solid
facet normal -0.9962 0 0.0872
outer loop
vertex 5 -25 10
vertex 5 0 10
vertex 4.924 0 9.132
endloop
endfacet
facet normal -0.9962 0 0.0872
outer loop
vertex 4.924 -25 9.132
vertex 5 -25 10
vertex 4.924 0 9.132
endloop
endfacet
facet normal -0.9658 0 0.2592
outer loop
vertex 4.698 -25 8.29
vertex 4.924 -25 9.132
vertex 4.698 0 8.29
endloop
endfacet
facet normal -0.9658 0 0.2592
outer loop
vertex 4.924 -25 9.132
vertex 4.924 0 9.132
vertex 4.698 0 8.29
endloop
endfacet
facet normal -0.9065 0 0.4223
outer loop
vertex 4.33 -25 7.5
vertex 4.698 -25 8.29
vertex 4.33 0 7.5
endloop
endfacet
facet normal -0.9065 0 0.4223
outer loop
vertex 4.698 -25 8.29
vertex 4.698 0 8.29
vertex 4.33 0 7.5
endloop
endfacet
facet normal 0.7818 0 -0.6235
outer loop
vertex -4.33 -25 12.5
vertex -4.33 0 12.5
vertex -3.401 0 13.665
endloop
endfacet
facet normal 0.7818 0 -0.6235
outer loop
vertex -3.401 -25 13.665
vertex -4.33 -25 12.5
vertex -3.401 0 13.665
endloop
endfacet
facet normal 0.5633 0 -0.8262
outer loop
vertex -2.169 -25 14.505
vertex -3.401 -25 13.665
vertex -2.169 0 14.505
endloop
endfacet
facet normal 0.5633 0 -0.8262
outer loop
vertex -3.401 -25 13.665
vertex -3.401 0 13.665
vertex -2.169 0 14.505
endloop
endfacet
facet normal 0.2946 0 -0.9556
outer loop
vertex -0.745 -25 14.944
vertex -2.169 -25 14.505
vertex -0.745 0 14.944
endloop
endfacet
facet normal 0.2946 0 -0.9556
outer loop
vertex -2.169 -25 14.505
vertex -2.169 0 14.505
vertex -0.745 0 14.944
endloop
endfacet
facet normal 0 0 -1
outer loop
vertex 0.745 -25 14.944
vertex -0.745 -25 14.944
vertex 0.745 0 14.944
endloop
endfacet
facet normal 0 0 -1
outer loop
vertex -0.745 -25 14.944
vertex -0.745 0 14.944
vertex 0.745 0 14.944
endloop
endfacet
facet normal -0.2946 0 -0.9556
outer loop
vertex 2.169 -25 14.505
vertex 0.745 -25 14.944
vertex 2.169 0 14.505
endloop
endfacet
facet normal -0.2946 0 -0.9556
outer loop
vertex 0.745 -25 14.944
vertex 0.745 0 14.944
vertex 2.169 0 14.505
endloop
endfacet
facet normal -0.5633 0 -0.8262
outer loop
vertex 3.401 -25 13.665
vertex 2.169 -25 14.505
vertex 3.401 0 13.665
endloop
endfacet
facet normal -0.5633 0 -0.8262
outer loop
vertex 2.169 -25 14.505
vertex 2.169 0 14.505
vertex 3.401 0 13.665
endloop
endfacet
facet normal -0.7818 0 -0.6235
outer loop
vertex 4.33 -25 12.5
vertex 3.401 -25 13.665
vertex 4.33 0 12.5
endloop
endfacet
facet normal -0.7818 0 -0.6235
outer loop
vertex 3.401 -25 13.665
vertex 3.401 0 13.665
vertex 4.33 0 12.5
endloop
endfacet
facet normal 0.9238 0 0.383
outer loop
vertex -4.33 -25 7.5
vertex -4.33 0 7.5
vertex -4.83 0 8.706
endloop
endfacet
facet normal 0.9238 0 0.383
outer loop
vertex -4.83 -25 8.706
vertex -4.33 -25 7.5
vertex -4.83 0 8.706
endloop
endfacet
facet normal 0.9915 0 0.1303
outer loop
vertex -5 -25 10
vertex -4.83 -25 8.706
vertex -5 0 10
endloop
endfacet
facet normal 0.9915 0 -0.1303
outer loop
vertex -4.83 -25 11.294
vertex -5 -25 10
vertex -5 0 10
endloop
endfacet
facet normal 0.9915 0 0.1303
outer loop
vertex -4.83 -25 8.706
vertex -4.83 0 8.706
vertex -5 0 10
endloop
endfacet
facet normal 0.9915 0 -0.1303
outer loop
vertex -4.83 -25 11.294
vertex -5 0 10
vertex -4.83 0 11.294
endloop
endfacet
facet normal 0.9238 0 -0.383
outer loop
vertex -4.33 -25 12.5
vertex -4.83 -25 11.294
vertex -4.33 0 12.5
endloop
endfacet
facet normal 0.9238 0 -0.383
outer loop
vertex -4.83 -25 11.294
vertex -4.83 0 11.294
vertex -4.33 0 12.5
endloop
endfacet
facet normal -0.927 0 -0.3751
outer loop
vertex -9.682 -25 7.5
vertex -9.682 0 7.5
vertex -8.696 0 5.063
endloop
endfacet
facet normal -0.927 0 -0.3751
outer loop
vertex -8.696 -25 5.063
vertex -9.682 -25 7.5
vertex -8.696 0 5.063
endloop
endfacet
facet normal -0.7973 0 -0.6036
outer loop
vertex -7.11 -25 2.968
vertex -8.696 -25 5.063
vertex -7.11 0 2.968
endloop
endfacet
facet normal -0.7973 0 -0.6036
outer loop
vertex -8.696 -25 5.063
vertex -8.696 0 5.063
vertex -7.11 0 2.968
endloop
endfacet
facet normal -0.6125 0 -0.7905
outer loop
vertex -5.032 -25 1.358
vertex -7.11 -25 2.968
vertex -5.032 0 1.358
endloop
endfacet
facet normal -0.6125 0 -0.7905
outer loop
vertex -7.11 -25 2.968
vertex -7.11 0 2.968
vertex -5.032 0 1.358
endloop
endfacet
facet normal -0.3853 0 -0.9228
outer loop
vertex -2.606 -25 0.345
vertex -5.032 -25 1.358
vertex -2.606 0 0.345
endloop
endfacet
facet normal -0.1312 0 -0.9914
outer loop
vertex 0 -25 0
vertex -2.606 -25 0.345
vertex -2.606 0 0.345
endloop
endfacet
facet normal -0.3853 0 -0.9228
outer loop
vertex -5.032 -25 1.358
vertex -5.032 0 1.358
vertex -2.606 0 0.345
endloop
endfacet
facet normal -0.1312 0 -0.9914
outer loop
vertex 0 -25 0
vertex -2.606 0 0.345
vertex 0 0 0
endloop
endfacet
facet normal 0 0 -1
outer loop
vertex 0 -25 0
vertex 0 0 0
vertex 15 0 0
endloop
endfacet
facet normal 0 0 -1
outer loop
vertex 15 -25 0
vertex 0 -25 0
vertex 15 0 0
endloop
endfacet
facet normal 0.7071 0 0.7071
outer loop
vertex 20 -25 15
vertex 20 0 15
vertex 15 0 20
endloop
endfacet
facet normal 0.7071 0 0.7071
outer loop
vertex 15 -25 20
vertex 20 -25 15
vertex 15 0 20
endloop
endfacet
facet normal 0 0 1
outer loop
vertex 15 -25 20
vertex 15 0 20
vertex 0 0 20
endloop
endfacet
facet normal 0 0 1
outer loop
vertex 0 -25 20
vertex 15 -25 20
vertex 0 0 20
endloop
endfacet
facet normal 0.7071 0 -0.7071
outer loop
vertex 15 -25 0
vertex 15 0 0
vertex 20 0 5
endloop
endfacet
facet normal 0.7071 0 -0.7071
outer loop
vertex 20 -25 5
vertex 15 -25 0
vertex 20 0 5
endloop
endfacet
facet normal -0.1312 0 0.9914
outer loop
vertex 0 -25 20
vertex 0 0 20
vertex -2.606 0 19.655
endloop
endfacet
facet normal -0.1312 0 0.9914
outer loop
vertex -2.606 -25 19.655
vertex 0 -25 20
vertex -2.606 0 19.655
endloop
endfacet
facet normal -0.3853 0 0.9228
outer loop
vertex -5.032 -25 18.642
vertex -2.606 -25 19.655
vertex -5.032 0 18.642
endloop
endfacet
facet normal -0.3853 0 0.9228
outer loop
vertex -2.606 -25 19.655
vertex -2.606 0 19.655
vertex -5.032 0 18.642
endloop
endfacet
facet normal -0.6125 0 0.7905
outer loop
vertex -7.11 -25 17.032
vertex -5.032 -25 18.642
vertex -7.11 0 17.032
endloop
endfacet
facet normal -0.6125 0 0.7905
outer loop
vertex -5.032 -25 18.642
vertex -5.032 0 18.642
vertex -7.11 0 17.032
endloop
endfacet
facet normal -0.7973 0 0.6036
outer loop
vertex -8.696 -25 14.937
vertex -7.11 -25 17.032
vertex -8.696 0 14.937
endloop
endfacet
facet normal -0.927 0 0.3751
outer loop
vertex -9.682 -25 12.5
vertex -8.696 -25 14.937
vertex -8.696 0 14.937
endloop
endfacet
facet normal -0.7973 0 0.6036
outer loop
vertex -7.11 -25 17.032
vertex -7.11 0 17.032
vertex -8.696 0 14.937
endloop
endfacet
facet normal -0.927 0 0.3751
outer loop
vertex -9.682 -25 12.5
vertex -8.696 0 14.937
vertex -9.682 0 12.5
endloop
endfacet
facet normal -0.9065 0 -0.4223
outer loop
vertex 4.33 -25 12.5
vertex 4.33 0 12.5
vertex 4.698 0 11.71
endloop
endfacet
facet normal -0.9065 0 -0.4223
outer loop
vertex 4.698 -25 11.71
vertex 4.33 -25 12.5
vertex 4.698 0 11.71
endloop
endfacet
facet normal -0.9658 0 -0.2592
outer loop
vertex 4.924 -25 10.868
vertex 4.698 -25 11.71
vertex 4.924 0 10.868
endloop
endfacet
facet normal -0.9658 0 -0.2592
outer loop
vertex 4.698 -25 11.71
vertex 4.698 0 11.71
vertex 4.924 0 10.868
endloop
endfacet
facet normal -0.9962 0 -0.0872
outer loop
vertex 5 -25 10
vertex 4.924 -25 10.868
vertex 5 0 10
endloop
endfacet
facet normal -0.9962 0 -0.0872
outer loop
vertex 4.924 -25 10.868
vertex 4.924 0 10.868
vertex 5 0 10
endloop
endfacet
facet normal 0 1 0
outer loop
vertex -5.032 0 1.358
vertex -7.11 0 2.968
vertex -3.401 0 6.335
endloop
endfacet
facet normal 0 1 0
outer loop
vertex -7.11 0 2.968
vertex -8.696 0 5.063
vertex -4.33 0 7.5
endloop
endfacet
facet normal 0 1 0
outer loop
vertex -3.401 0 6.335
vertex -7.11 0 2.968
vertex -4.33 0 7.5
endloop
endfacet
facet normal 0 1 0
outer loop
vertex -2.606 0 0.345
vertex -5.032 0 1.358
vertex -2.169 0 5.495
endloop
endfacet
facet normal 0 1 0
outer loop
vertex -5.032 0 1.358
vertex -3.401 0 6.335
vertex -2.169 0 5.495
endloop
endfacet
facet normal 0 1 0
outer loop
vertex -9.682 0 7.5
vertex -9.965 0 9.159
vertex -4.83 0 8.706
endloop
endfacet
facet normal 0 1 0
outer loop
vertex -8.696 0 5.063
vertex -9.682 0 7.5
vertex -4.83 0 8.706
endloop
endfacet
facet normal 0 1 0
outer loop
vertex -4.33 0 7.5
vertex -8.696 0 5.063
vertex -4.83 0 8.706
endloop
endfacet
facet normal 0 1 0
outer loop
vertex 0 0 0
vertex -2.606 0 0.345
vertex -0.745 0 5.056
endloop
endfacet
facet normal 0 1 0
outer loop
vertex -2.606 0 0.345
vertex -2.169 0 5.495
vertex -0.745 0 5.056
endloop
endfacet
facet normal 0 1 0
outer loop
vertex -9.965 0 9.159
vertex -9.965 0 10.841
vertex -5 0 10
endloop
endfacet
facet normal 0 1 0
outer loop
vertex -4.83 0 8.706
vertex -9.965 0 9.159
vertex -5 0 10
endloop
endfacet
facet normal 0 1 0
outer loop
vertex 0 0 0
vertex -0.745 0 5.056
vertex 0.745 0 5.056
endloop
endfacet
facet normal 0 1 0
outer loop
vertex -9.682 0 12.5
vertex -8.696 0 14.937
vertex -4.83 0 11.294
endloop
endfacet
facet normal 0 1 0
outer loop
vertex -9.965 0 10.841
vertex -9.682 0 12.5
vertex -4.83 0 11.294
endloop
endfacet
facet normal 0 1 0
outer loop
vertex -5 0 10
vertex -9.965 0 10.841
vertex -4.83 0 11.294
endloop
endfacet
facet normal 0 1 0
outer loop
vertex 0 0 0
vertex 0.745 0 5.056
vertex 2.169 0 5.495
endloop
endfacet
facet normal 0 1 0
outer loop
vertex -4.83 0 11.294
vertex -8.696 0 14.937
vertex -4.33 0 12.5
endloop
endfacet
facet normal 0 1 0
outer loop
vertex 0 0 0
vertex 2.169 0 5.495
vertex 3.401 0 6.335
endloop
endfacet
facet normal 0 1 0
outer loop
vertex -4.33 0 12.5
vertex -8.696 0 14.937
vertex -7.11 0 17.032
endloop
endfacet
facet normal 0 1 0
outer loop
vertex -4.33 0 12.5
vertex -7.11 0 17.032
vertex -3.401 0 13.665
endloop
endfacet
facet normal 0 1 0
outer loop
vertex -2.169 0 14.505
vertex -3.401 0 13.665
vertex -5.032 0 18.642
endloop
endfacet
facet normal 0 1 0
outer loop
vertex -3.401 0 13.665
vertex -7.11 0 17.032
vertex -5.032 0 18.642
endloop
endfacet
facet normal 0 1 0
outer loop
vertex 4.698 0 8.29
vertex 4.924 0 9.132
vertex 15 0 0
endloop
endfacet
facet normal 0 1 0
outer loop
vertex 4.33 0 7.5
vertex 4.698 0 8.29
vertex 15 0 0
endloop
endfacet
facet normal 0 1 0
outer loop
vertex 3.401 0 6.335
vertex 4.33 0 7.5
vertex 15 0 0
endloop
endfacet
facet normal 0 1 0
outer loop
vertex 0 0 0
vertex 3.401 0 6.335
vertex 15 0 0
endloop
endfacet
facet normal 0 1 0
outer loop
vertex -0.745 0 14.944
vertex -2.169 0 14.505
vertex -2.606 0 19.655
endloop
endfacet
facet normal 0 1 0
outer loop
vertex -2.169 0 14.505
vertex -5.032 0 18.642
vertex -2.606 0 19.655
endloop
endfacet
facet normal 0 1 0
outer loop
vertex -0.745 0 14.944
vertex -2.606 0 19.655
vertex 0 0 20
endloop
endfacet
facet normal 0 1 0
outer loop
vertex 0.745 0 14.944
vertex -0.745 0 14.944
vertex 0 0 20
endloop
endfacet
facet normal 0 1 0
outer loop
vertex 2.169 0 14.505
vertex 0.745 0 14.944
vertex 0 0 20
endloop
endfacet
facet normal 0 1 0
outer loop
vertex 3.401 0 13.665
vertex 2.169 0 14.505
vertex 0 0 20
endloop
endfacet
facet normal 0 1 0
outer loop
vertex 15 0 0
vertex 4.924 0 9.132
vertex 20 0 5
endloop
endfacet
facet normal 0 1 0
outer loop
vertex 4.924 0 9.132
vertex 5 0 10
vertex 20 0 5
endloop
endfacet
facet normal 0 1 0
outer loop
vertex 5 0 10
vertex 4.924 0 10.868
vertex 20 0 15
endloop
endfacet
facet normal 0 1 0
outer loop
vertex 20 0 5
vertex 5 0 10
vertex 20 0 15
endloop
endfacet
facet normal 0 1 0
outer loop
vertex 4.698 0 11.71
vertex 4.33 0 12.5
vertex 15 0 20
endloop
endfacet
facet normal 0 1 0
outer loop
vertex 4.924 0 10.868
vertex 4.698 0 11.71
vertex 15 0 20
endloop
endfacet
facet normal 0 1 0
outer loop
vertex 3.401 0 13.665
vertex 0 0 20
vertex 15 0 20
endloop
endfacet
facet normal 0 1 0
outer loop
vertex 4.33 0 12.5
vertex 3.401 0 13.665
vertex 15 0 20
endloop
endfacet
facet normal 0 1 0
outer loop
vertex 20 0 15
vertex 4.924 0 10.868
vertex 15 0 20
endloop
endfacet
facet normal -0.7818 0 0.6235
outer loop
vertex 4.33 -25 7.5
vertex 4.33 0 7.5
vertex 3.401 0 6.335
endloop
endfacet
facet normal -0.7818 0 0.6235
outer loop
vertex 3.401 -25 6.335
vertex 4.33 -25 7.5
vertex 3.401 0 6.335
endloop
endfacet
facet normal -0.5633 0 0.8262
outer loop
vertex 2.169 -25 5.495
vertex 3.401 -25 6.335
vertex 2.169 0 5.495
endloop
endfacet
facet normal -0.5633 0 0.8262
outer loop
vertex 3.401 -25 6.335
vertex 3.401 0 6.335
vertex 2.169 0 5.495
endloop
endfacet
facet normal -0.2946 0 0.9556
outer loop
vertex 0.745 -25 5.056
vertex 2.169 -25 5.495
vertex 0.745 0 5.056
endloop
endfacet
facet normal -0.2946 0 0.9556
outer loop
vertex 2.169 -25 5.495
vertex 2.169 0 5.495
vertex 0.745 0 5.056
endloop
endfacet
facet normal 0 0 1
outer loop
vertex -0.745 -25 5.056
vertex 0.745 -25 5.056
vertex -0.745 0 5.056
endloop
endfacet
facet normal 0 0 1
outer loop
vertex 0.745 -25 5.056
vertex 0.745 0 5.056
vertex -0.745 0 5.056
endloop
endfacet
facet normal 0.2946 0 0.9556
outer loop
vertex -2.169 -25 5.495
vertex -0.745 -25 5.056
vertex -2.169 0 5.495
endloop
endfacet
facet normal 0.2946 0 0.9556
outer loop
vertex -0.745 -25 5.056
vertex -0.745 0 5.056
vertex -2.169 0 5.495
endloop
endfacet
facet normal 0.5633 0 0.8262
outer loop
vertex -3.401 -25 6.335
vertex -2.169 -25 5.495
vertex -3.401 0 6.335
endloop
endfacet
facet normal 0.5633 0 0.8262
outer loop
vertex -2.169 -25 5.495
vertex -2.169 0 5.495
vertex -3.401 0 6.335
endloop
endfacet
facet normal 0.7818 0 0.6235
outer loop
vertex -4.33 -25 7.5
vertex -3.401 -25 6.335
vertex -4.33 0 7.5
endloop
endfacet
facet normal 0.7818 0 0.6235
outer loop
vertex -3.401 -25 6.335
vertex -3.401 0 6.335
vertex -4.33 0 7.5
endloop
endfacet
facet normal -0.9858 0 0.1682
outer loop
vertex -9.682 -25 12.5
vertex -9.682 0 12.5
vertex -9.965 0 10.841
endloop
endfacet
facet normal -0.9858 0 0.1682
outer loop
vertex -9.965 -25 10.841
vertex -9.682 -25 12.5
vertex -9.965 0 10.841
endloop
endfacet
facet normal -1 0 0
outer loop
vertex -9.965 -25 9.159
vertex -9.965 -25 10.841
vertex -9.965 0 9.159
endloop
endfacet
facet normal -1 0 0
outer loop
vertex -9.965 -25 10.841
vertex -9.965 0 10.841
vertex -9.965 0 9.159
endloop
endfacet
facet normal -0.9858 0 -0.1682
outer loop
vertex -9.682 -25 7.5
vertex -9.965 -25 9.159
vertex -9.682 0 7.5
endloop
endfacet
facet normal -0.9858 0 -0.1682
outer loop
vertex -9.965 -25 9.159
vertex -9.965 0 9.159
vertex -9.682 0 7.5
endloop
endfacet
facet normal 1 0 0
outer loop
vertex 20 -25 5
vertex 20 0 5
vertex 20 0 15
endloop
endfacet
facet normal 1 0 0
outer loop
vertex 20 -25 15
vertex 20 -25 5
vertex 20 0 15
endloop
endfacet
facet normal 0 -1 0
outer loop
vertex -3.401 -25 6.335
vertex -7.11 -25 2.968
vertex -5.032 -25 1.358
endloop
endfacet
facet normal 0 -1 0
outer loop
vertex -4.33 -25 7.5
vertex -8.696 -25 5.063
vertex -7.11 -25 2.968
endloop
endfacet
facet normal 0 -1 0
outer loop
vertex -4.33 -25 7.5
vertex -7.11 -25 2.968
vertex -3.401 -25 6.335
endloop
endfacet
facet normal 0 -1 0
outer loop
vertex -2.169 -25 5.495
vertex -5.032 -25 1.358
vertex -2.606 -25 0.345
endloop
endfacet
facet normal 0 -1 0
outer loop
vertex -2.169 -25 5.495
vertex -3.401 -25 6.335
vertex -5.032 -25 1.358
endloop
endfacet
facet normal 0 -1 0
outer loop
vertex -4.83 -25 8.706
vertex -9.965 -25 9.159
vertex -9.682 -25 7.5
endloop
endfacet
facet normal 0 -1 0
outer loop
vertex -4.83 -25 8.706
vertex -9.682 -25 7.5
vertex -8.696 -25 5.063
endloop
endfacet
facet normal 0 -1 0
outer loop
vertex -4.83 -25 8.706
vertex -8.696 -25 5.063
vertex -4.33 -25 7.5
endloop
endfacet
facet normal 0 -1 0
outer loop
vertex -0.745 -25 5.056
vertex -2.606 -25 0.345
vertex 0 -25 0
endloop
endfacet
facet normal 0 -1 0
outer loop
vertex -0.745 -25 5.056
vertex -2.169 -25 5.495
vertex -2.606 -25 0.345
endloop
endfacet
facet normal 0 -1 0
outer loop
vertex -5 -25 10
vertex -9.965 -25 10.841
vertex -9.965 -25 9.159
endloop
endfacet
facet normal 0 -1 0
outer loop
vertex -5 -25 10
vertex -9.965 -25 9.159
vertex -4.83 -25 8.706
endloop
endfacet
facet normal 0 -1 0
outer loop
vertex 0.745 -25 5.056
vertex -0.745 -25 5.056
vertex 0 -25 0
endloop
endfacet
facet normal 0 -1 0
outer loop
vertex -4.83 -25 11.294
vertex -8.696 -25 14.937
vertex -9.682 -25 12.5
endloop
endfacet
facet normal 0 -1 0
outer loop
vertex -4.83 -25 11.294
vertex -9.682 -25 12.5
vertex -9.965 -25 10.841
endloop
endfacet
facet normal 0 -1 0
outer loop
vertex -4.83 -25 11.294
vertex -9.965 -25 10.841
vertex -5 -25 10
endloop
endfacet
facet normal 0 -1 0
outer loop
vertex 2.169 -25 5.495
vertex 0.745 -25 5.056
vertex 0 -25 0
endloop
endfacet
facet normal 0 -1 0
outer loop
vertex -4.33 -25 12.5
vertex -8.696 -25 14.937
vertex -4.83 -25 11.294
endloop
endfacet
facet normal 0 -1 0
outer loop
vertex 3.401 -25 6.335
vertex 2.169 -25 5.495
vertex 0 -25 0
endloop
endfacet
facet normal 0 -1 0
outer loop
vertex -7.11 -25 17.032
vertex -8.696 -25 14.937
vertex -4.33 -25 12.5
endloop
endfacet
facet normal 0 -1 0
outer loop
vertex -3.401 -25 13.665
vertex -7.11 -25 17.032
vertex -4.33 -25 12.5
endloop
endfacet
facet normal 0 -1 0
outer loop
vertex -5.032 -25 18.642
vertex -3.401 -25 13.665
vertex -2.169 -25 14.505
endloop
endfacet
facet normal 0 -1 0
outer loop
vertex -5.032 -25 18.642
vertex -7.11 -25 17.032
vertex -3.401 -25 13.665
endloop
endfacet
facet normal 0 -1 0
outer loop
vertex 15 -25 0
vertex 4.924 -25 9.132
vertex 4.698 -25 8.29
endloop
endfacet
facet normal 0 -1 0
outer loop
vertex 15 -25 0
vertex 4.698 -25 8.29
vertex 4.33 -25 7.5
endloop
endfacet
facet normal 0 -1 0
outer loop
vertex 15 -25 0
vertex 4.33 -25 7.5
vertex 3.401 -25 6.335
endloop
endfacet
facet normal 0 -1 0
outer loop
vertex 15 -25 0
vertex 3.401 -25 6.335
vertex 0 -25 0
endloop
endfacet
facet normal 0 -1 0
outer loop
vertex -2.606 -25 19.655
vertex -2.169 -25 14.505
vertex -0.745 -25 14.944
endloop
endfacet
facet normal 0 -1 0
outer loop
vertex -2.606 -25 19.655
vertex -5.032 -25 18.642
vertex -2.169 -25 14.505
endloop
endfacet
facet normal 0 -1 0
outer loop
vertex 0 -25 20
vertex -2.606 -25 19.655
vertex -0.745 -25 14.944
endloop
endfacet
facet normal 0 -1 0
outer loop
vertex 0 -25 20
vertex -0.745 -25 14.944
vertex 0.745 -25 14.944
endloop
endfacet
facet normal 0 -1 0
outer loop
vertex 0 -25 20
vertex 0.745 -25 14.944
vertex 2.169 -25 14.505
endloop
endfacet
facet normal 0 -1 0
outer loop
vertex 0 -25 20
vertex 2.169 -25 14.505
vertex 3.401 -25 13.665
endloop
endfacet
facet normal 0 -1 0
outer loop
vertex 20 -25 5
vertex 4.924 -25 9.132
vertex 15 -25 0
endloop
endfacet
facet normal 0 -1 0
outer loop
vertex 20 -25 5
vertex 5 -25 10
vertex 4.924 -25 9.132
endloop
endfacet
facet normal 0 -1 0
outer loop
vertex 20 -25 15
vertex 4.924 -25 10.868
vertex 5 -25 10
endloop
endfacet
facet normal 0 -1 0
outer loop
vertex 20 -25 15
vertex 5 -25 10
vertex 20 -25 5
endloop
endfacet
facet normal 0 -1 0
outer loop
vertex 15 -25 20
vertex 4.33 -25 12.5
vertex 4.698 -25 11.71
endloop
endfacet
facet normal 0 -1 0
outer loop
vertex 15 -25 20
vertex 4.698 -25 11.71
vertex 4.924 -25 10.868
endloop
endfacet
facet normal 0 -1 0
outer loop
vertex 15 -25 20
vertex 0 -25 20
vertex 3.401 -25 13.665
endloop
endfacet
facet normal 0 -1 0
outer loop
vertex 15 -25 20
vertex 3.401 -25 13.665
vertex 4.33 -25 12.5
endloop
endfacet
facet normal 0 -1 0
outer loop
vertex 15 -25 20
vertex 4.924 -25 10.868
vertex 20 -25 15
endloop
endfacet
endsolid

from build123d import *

# Parameters (mm, degrees)
F1_DEPTH = 25


with BuildPart() as f1:
    # F0 (on Front) → F1 (new body)
    with BuildSketch(Plane.XZ):
        with BuildLine():
            ThreePointArc((9.682458, 7.5), (6.123724, 2.094306), (0, 0))
            Line((0, 0), (15, 0))
            Line((15, 0), (20, 5))
            Line((20, 5), (20, 7.5))
            Line((20, 7.5), (9.682458, 7.5))
        make_face()
        with BuildLine():
            ThreePointArc((-9.682458, 7.5), (-6.123724, 2.094306), (0, 0))
            ThreePointArc((0, 0), (6.123724, 2.094306), (9.682458, 7.5))
            Line((9.682458, 7.5), (4.330127, 7.5))
            ThreePointArc((4.330127, 7.5), (0, 5), (-4.330127, 7.5))
            Line((-4.330127, 7.5), (-9.682458, 7.5))
        make_face()
        with BuildLine():
            ThreePointArc((-9.682458, 12.5), (-10, 10), (-9.682458, 7.5))
            Line((-9.682458, 7.5), (-4.330127, 7.5))
            ThreePointArc((-4.330127, 7.5), (-5, 10), (-4.330127, 12.5))
            Line((-4.330127, 12.5), (-9.682458, 12.5))
        make_face()
        with BuildLine():
            Line((4.330127, 7.5), (9.682458, 7.5))
            Line((9.682458, 7.5), (20, 7.5))
            Line((20, 7.5), (20, 12.5))
            Line((20, 12.5), (9.682458, 12.5))
            Line((9.682458, 12.5), (4.330127, 12.5))
            ThreePointArc((4.330127, 12.5), (4.829629, 11.294095), (5, 10))
            ThreePointArc((5, 10), (4.829629, 8.705905), (4.330127, 7.5))
        make_face()
        with BuildLine():
            ThreePointArc((0, 20), (-6.123724, 17.905694), (-9.682458, 12.5))
            Line((-9.682458, 12.5), (-4.330127, 12.5))
            ThreePointArc((-4.330127, 12.5), (0, 15), (4.330127, 12.5))
            Line((4.330127, 12.5), (9.682458, 12.5))
            ThreePointArc((9.682458, 12.5), (6.123724, 17.905694), (0, 20))
        make_face()
        with BuildLine():
            Line((15, 20), (0, 20))
            ThreePointArc((0, 20), (6.123724, 17.905694), (9.682458, 12.5))
            Line((9.682458, 12.5), (20, 12.5))
            Line((20, 12.5), (20, 15))
            Line((20, 15), (15, 20))
        make_face()
    extrude(amount=F1_DEPTH)


solid = f1.part
